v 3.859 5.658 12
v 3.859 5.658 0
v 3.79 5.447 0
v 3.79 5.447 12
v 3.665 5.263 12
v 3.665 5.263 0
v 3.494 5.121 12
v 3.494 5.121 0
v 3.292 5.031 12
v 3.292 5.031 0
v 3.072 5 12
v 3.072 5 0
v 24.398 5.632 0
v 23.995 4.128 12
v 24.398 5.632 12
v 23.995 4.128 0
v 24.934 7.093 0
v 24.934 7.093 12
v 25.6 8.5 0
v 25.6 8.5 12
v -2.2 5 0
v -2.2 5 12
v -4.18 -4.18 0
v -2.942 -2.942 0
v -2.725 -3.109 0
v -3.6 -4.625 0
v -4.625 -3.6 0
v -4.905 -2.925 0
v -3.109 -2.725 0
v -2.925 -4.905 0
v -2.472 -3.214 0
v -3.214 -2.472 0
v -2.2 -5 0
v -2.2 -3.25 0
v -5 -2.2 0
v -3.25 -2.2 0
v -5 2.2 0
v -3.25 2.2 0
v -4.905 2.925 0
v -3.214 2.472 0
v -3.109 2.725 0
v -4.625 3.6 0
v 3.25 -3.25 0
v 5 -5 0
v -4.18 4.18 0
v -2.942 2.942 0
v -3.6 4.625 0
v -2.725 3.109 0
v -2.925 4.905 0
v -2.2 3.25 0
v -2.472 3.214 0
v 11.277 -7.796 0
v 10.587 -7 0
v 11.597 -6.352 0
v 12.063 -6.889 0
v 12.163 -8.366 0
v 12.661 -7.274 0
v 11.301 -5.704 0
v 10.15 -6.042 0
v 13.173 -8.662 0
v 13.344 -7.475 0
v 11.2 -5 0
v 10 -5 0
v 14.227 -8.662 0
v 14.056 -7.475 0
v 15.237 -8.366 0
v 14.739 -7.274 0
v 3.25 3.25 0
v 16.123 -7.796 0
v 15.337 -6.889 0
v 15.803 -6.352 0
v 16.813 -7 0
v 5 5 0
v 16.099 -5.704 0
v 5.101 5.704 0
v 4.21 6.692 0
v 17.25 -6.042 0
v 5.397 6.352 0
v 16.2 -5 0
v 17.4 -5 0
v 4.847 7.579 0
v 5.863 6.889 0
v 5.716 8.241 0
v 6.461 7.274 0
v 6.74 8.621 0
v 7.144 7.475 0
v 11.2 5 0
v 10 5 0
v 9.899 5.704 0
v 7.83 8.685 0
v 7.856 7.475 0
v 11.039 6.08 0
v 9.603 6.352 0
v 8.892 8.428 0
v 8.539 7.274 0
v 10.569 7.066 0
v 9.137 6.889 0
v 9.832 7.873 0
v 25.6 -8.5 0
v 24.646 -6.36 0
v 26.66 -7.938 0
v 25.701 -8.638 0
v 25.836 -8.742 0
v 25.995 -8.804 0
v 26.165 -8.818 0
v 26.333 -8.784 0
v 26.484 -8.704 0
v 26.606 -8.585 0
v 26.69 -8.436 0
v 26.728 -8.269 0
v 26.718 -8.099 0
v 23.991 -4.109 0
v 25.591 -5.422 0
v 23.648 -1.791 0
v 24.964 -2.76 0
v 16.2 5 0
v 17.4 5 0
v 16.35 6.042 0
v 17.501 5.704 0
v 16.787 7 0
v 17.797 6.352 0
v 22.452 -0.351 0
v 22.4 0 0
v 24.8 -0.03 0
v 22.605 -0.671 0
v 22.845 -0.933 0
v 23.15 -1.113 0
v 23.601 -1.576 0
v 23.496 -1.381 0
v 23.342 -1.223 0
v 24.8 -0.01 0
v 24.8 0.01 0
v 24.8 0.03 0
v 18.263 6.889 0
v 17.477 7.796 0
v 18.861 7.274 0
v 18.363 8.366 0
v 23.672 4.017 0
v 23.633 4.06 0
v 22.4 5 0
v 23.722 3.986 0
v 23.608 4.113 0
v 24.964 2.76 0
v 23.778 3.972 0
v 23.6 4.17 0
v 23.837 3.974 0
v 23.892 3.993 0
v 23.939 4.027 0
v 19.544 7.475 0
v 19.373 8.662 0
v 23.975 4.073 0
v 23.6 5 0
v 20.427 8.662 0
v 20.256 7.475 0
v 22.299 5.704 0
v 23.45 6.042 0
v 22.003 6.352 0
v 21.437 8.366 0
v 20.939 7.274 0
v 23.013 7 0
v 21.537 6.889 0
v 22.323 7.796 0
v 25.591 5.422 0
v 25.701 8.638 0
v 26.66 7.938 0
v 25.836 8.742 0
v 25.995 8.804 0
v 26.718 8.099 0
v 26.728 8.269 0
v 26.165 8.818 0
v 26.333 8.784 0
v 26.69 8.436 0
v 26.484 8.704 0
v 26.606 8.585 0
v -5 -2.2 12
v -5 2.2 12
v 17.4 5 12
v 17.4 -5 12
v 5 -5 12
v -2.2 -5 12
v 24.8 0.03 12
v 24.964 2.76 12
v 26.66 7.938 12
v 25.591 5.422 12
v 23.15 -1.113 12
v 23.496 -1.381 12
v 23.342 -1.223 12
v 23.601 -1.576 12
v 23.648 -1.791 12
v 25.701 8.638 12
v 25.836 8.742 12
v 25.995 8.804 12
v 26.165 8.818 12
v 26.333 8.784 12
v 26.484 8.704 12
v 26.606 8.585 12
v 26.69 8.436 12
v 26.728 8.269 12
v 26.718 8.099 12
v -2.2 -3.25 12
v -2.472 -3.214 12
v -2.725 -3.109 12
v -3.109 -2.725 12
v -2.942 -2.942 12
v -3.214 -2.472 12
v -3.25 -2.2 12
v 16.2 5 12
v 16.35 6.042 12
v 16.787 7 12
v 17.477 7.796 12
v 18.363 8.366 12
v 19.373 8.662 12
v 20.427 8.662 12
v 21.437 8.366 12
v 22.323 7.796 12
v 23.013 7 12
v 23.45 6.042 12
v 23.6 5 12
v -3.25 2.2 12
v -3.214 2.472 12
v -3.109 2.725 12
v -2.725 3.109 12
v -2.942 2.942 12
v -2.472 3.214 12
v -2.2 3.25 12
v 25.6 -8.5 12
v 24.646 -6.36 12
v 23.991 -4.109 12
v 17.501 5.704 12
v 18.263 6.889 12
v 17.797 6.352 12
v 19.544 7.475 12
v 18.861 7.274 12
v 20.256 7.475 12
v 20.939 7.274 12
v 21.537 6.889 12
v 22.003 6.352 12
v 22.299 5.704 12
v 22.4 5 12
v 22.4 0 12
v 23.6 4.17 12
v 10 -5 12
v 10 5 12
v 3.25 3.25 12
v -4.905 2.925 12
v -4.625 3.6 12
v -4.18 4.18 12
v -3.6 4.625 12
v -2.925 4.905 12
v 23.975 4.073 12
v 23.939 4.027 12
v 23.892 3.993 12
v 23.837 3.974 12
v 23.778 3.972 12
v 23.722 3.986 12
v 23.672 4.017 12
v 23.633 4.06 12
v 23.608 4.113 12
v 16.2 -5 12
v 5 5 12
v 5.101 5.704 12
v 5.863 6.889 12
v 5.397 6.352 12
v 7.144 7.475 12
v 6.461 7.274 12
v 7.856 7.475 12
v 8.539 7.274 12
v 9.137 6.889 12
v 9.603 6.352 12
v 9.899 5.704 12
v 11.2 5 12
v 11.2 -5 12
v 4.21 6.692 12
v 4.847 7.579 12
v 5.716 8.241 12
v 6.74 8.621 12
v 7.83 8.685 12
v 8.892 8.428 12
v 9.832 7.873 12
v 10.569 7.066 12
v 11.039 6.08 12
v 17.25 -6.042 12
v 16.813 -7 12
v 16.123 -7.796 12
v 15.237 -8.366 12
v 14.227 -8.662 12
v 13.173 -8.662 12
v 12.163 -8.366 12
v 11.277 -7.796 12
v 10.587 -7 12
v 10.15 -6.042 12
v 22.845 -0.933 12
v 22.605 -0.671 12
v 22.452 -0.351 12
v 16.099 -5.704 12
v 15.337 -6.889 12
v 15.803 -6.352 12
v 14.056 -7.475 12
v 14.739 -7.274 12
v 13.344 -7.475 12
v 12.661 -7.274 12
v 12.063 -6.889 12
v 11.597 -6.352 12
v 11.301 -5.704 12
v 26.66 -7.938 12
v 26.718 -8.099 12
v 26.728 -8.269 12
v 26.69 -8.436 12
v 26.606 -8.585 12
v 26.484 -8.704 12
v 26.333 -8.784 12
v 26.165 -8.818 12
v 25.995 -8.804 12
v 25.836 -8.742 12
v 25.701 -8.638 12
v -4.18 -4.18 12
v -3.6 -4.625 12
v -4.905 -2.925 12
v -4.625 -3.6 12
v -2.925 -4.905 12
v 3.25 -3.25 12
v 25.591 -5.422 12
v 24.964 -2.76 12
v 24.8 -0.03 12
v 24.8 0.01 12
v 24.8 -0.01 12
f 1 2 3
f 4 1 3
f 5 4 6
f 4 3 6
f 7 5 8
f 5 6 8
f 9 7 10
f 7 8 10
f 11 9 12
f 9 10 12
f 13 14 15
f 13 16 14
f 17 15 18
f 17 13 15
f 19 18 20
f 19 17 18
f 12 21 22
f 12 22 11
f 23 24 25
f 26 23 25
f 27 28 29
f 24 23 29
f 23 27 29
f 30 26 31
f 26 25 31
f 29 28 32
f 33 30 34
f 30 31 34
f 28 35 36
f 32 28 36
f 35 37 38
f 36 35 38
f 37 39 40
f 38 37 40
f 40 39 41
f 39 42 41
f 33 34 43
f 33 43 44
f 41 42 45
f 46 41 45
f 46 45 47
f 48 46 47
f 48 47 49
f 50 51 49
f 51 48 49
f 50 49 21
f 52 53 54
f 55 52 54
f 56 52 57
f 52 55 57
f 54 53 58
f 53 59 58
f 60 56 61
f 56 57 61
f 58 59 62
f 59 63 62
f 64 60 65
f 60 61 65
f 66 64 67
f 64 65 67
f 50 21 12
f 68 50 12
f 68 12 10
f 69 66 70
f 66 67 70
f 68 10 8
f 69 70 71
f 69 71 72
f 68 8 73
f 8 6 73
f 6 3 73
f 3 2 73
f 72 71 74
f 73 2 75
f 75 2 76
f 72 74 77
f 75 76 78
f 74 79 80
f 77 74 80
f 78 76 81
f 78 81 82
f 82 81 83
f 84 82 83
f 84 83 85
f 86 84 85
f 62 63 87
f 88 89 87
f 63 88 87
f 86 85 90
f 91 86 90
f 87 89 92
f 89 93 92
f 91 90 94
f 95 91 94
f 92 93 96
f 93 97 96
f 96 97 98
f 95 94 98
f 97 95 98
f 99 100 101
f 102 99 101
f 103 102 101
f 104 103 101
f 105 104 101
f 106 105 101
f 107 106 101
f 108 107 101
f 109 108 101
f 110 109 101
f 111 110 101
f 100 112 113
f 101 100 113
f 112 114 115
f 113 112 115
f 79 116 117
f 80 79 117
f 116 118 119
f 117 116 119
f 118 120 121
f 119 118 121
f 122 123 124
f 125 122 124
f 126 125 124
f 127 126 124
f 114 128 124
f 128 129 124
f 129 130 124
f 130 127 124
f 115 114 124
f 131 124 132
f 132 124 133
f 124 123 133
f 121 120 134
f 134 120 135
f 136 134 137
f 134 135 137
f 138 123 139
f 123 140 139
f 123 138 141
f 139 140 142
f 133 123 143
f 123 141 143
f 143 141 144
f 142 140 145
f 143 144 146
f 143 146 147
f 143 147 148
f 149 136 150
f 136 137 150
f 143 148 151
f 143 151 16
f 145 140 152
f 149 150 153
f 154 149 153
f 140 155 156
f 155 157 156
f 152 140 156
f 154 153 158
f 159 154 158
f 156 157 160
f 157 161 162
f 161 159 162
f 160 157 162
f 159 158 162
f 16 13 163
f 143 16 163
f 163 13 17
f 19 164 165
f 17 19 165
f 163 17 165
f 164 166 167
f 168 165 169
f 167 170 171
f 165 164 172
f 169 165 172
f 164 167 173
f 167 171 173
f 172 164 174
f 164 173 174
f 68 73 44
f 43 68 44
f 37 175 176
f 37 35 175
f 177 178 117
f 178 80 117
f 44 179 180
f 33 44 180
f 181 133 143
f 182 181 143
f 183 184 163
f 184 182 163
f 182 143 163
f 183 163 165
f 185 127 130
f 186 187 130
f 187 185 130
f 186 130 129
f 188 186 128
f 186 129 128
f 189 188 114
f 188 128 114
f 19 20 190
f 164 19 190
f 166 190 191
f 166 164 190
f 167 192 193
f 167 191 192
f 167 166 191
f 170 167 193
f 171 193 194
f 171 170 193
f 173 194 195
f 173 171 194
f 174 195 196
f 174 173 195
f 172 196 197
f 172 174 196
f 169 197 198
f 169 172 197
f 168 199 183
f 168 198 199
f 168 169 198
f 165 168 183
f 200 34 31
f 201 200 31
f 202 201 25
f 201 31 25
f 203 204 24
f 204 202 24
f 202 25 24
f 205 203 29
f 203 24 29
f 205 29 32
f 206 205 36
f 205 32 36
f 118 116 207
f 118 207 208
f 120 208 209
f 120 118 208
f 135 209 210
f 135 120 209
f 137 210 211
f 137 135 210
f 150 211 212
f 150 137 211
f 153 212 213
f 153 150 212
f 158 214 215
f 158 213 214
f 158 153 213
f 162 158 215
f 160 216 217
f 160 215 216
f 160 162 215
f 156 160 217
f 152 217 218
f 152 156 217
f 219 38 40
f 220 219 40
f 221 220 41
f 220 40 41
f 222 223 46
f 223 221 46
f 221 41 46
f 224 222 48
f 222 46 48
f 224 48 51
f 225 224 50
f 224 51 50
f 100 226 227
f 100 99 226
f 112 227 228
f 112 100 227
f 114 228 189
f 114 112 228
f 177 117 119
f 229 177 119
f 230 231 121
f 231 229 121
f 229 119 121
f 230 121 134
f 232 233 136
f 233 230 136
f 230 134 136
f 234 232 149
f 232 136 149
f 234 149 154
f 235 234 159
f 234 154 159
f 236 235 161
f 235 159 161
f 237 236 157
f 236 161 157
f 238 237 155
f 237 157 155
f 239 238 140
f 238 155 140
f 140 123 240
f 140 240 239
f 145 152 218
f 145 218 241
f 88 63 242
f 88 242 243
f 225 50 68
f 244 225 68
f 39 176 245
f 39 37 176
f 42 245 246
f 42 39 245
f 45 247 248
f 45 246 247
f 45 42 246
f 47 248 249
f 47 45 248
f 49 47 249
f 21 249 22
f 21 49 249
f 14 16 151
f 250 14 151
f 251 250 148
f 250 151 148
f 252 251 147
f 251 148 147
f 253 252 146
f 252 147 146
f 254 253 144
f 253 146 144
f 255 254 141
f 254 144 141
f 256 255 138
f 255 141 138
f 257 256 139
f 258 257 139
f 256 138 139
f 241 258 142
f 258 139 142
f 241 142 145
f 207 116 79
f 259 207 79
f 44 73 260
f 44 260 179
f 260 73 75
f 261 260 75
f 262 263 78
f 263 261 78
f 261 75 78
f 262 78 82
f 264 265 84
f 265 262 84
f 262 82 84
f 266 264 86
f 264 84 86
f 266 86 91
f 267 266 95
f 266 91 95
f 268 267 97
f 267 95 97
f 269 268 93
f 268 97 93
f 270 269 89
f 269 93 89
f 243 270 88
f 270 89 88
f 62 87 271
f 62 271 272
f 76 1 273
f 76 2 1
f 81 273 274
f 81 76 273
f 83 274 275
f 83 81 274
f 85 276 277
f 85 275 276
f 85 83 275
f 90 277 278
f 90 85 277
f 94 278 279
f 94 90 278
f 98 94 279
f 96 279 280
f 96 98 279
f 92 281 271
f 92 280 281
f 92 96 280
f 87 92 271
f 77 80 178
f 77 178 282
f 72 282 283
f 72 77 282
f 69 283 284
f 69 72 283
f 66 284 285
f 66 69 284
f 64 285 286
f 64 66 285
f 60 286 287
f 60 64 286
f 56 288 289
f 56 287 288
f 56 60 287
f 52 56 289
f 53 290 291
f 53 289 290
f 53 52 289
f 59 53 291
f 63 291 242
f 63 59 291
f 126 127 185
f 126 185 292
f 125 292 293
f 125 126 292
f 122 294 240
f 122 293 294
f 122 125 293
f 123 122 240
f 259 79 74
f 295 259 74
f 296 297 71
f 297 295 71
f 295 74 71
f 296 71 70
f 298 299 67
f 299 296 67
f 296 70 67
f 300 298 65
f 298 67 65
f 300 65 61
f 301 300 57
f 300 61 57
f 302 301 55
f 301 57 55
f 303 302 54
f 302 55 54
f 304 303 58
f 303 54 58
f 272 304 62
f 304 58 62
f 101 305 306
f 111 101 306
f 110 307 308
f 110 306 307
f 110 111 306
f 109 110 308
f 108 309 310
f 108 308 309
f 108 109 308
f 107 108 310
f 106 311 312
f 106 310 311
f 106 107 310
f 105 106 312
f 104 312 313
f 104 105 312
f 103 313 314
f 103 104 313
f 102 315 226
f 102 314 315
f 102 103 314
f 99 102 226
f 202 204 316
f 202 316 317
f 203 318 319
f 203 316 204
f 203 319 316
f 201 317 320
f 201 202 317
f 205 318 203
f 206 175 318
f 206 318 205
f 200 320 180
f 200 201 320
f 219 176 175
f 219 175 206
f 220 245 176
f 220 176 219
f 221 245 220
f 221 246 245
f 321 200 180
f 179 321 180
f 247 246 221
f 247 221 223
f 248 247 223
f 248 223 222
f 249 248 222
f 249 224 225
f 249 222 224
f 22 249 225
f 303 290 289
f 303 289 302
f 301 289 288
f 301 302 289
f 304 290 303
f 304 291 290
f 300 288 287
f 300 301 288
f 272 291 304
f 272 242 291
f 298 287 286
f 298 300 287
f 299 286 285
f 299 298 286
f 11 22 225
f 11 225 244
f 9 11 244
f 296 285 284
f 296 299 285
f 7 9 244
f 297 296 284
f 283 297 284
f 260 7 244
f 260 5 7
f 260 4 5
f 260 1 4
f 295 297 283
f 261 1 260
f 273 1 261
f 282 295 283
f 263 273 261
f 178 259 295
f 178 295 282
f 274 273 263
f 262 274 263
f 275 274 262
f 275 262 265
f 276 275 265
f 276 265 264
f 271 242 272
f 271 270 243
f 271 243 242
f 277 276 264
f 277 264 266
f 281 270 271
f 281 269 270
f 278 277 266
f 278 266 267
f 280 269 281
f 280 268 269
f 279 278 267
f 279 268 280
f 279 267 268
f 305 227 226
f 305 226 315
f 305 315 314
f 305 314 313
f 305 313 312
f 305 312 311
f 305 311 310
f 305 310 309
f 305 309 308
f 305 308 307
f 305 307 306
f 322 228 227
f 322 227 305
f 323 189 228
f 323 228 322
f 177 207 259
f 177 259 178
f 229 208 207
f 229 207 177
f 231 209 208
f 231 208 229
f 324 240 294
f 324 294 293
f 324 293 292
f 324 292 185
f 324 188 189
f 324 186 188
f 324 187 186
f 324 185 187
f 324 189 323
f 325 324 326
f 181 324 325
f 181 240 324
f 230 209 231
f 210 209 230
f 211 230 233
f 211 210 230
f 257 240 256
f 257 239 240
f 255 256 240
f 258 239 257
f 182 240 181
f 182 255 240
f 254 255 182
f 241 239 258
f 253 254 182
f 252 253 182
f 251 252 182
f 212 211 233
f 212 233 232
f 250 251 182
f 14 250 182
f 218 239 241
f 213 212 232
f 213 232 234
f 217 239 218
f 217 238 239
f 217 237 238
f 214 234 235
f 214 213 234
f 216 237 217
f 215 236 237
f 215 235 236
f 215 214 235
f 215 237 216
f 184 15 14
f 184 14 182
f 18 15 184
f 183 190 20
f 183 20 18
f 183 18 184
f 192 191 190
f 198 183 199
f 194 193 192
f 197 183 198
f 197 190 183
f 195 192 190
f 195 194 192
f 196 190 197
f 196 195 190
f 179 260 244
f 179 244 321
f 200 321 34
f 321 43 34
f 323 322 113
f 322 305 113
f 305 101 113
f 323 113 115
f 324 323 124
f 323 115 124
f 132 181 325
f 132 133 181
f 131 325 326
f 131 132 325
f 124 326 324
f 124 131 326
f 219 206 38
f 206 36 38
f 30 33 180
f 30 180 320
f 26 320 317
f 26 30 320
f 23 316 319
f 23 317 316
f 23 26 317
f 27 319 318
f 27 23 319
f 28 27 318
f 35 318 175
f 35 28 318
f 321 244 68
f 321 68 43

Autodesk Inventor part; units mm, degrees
ref_plane "YZ Plane" through (0, 0, 0) normal (1, 0, 0) x (0, 1, 0)
ref_plane "XZ Plane" through (0, 0, 0) normal (0, 1, 0) x (-1, 0, 0)
ref_plane "XY Plane" through (0, 0, 0) normal (0, 0, 1) x (1, 0, 0)
sketch "Boceto1" plane through (0, 0, 0) normal (0, 0, 1) x (1, 0, 0)
  line L0 (3, -11.4) -> (3, -5.5)
  line L1 (3, -5.5) -> (-2.2, -5.5)
  arc A0 (-5.5, -2.2) -> (-2.2, -5.5) centre (-2.2, -2.2) ccw
  line L2 (-5.5, -2.2) -> (-5.5, 2.2)
  arc A1 (-2.2, 5.5) -> (-5.5, 2.2) centre (-2.2, 2.2) ccw
  line L3 (-2.2, 5.5) -> (3, 5.5)
  line L4 (3, 5.5) -> (3, 11.4)
  line L5 (3, 3) -> (-2.2, 3)
  arc A2 (-2.2, 3) -> (-3, 2.2) centre (-2.2, 2.2) ccw
  line L6 (-3, 2.2) -> (-3, -2.2)
  arc A3 (-3, -2.2) -> (-2.2, -3) centre (-2.2, -2.2) ccw
  line L7 (-2.2, -3) -> (3, -3)
  line L8 (3, -3) -> (3, 3)
  line L9 (-2.2, 3.25) -> (3.25, 3.25)
  line L10 (3.25, 3.25) -> (3.25, -3.25)
  line L11 (3.25, -3.25) -> (-2.2, -3.25)
  arc A4 (-3.25, -2.2) -> (-2.2, -3.25) centre (-2.2, -2.2) ccw
  line L12 (-3.25, -2.2) -> (-3.25, 2.2)
  arc A5 (-2.2, 3.25) -> (-3.25, 2.2) centre (-2.2, 2.2) ccw
  line L13 (-2.2, 5) -> (5, 5)
  line L14 (5, 5) -> (5, -5)
  line L15 (5, -5) -> (-2.2, -5)
  arc A6 (-5, -2.2) -> (-2.2, -5) centre (-2.2, -2.2) ccw
  line L16 (-5, -2.2) -> (-5, 2.2)
  arc A7 (-2.2, 5) -> (-5, 2.2) centre (-2.2, 2.2) ccw
  line L17 (5, 5) -> (7.5, 5)
  line L18 (10, 5) -> (11.2, 5)
  line L19 (11.2, 5) -> (11.2, -5)
  line L20 (11.2, -5) -> (10, -5)
  line L21 (10, -5) -> (10, 5)
  line L22 (11.2, -5) -> (13.7, -5)
  line L23 (16.2, -5) -> (17.4, -5)
  line L24 (17.4, -5) -> (17.4, 5)
  line L25 (17.4, 5) -> (16.2, 5)
  line L26 (16.2, 5) -> (16.2, -5)
  line L27 (17.4, 5) -> (19.9, 5)
  line L28 (22.4, 5) -> (23.6, 5)
  line L29 (23.6, 5) -> (23.6, 0)
  line L30 (23.6, 0) -> (22.4, 0)
  line L31 (22.4, 0) -> (22.4, 5)
  arc A8 (11.2, 5) -> (3.8, 5) centre (7.5, 5) ccw
  arc A9 (10, 5) -> (5, 5) centre (7.5, 5) ccw
  arc A10 (10, -5) -> (17.4, -5) centre (13.7, -5) ccw
  arc A11 (11.2, -5) -> (16.2, -5) centre (13.7, -5) ccw
  arc A12 (22.4, 5) -> (17.4, 5) centre (19.9, 5) ccw
  arc A13 (23.6, 5) -> (16.2, 5) centre (19.9, 5) ccw
  arc A14 (25.6, 8.5) -> (23.6, 0) centre (40.821, 0.4333) ccw
  circle A15 centre (23.6, 0) radius 1.2
  arc A16 (26.6603, 7.9381) -> (24.7996, 0.0302) centre (40.821, 0.4333) ccw
  line L32 (25.6, 8.5) -> (25.9736, 8.302)
  arc A17 (26.6603, 7.9381) -> (25.6, 8.5) centre (26.1301, 8.219) ccw
  arc A18 (23.6, 0) -> (25.6, -8.5) centre (40.821, -0.4333) ccw
  arc A19 (24.7996, -0.0302) -> (26.6603, -7.9381) centre (40.821, -0.4333) ccw
  line L33 (25.9736, -8.302) -> (26.6603, -7.9381)
  arc A20 (25.6, -8.5) -> (26.6603, -7.9381) centre (26.1301, -8.219) ccw
  point P0 (0, 0)
  point P1 (5, -5)
  point P2 (4.2, -5)
  point P3 (23, 0)
  point P4 (23.6, 1.2)
  point P5 (23.6116, -1.1999)
  point P6 (24.7996, 0.0302)
  point P7 (23.6116, 1.1999)
  dimension "d1" = 0.25
  dimension "d2" = 2
  dimension "d31" = 2.5
  dimension "d33" = 10
  dimension "d34" = 2.5
  dimension "d35" = 1.2
  dimension "d36" = 10
  dimension "d37" = 2.5
  dimension "d41" = 1.2
extrude "Extrusión1" add sketch "Boceto1" along normal blind 12 contours L13 L14 L15 A6 L16 A7 | A8 L18 A9 L13 | L19 L20 L21 L18 | A11 L23 A10 L20 | L26 L25 L24 L23 | A13 L28 A12 L25 | L29 A15 L31 L28 | A15 A14 L29 | L29 A14 L30 A15 | L30 A18 A15 | A14 A15 A18 L29 | L29 A14 | A14 A17 A16 A15 | A15 A19 A20 A18
fillet "Empalme1" radius 0.8 2 edges at (3.8, 5, 6) (23.6116, -1.1999, 6)
fillet "Empalme1" radius 0.2 2 edges at (23.6, 1.2, 6) (23.6116, 1.1999, 6)
properties part number "_3DPrint"
